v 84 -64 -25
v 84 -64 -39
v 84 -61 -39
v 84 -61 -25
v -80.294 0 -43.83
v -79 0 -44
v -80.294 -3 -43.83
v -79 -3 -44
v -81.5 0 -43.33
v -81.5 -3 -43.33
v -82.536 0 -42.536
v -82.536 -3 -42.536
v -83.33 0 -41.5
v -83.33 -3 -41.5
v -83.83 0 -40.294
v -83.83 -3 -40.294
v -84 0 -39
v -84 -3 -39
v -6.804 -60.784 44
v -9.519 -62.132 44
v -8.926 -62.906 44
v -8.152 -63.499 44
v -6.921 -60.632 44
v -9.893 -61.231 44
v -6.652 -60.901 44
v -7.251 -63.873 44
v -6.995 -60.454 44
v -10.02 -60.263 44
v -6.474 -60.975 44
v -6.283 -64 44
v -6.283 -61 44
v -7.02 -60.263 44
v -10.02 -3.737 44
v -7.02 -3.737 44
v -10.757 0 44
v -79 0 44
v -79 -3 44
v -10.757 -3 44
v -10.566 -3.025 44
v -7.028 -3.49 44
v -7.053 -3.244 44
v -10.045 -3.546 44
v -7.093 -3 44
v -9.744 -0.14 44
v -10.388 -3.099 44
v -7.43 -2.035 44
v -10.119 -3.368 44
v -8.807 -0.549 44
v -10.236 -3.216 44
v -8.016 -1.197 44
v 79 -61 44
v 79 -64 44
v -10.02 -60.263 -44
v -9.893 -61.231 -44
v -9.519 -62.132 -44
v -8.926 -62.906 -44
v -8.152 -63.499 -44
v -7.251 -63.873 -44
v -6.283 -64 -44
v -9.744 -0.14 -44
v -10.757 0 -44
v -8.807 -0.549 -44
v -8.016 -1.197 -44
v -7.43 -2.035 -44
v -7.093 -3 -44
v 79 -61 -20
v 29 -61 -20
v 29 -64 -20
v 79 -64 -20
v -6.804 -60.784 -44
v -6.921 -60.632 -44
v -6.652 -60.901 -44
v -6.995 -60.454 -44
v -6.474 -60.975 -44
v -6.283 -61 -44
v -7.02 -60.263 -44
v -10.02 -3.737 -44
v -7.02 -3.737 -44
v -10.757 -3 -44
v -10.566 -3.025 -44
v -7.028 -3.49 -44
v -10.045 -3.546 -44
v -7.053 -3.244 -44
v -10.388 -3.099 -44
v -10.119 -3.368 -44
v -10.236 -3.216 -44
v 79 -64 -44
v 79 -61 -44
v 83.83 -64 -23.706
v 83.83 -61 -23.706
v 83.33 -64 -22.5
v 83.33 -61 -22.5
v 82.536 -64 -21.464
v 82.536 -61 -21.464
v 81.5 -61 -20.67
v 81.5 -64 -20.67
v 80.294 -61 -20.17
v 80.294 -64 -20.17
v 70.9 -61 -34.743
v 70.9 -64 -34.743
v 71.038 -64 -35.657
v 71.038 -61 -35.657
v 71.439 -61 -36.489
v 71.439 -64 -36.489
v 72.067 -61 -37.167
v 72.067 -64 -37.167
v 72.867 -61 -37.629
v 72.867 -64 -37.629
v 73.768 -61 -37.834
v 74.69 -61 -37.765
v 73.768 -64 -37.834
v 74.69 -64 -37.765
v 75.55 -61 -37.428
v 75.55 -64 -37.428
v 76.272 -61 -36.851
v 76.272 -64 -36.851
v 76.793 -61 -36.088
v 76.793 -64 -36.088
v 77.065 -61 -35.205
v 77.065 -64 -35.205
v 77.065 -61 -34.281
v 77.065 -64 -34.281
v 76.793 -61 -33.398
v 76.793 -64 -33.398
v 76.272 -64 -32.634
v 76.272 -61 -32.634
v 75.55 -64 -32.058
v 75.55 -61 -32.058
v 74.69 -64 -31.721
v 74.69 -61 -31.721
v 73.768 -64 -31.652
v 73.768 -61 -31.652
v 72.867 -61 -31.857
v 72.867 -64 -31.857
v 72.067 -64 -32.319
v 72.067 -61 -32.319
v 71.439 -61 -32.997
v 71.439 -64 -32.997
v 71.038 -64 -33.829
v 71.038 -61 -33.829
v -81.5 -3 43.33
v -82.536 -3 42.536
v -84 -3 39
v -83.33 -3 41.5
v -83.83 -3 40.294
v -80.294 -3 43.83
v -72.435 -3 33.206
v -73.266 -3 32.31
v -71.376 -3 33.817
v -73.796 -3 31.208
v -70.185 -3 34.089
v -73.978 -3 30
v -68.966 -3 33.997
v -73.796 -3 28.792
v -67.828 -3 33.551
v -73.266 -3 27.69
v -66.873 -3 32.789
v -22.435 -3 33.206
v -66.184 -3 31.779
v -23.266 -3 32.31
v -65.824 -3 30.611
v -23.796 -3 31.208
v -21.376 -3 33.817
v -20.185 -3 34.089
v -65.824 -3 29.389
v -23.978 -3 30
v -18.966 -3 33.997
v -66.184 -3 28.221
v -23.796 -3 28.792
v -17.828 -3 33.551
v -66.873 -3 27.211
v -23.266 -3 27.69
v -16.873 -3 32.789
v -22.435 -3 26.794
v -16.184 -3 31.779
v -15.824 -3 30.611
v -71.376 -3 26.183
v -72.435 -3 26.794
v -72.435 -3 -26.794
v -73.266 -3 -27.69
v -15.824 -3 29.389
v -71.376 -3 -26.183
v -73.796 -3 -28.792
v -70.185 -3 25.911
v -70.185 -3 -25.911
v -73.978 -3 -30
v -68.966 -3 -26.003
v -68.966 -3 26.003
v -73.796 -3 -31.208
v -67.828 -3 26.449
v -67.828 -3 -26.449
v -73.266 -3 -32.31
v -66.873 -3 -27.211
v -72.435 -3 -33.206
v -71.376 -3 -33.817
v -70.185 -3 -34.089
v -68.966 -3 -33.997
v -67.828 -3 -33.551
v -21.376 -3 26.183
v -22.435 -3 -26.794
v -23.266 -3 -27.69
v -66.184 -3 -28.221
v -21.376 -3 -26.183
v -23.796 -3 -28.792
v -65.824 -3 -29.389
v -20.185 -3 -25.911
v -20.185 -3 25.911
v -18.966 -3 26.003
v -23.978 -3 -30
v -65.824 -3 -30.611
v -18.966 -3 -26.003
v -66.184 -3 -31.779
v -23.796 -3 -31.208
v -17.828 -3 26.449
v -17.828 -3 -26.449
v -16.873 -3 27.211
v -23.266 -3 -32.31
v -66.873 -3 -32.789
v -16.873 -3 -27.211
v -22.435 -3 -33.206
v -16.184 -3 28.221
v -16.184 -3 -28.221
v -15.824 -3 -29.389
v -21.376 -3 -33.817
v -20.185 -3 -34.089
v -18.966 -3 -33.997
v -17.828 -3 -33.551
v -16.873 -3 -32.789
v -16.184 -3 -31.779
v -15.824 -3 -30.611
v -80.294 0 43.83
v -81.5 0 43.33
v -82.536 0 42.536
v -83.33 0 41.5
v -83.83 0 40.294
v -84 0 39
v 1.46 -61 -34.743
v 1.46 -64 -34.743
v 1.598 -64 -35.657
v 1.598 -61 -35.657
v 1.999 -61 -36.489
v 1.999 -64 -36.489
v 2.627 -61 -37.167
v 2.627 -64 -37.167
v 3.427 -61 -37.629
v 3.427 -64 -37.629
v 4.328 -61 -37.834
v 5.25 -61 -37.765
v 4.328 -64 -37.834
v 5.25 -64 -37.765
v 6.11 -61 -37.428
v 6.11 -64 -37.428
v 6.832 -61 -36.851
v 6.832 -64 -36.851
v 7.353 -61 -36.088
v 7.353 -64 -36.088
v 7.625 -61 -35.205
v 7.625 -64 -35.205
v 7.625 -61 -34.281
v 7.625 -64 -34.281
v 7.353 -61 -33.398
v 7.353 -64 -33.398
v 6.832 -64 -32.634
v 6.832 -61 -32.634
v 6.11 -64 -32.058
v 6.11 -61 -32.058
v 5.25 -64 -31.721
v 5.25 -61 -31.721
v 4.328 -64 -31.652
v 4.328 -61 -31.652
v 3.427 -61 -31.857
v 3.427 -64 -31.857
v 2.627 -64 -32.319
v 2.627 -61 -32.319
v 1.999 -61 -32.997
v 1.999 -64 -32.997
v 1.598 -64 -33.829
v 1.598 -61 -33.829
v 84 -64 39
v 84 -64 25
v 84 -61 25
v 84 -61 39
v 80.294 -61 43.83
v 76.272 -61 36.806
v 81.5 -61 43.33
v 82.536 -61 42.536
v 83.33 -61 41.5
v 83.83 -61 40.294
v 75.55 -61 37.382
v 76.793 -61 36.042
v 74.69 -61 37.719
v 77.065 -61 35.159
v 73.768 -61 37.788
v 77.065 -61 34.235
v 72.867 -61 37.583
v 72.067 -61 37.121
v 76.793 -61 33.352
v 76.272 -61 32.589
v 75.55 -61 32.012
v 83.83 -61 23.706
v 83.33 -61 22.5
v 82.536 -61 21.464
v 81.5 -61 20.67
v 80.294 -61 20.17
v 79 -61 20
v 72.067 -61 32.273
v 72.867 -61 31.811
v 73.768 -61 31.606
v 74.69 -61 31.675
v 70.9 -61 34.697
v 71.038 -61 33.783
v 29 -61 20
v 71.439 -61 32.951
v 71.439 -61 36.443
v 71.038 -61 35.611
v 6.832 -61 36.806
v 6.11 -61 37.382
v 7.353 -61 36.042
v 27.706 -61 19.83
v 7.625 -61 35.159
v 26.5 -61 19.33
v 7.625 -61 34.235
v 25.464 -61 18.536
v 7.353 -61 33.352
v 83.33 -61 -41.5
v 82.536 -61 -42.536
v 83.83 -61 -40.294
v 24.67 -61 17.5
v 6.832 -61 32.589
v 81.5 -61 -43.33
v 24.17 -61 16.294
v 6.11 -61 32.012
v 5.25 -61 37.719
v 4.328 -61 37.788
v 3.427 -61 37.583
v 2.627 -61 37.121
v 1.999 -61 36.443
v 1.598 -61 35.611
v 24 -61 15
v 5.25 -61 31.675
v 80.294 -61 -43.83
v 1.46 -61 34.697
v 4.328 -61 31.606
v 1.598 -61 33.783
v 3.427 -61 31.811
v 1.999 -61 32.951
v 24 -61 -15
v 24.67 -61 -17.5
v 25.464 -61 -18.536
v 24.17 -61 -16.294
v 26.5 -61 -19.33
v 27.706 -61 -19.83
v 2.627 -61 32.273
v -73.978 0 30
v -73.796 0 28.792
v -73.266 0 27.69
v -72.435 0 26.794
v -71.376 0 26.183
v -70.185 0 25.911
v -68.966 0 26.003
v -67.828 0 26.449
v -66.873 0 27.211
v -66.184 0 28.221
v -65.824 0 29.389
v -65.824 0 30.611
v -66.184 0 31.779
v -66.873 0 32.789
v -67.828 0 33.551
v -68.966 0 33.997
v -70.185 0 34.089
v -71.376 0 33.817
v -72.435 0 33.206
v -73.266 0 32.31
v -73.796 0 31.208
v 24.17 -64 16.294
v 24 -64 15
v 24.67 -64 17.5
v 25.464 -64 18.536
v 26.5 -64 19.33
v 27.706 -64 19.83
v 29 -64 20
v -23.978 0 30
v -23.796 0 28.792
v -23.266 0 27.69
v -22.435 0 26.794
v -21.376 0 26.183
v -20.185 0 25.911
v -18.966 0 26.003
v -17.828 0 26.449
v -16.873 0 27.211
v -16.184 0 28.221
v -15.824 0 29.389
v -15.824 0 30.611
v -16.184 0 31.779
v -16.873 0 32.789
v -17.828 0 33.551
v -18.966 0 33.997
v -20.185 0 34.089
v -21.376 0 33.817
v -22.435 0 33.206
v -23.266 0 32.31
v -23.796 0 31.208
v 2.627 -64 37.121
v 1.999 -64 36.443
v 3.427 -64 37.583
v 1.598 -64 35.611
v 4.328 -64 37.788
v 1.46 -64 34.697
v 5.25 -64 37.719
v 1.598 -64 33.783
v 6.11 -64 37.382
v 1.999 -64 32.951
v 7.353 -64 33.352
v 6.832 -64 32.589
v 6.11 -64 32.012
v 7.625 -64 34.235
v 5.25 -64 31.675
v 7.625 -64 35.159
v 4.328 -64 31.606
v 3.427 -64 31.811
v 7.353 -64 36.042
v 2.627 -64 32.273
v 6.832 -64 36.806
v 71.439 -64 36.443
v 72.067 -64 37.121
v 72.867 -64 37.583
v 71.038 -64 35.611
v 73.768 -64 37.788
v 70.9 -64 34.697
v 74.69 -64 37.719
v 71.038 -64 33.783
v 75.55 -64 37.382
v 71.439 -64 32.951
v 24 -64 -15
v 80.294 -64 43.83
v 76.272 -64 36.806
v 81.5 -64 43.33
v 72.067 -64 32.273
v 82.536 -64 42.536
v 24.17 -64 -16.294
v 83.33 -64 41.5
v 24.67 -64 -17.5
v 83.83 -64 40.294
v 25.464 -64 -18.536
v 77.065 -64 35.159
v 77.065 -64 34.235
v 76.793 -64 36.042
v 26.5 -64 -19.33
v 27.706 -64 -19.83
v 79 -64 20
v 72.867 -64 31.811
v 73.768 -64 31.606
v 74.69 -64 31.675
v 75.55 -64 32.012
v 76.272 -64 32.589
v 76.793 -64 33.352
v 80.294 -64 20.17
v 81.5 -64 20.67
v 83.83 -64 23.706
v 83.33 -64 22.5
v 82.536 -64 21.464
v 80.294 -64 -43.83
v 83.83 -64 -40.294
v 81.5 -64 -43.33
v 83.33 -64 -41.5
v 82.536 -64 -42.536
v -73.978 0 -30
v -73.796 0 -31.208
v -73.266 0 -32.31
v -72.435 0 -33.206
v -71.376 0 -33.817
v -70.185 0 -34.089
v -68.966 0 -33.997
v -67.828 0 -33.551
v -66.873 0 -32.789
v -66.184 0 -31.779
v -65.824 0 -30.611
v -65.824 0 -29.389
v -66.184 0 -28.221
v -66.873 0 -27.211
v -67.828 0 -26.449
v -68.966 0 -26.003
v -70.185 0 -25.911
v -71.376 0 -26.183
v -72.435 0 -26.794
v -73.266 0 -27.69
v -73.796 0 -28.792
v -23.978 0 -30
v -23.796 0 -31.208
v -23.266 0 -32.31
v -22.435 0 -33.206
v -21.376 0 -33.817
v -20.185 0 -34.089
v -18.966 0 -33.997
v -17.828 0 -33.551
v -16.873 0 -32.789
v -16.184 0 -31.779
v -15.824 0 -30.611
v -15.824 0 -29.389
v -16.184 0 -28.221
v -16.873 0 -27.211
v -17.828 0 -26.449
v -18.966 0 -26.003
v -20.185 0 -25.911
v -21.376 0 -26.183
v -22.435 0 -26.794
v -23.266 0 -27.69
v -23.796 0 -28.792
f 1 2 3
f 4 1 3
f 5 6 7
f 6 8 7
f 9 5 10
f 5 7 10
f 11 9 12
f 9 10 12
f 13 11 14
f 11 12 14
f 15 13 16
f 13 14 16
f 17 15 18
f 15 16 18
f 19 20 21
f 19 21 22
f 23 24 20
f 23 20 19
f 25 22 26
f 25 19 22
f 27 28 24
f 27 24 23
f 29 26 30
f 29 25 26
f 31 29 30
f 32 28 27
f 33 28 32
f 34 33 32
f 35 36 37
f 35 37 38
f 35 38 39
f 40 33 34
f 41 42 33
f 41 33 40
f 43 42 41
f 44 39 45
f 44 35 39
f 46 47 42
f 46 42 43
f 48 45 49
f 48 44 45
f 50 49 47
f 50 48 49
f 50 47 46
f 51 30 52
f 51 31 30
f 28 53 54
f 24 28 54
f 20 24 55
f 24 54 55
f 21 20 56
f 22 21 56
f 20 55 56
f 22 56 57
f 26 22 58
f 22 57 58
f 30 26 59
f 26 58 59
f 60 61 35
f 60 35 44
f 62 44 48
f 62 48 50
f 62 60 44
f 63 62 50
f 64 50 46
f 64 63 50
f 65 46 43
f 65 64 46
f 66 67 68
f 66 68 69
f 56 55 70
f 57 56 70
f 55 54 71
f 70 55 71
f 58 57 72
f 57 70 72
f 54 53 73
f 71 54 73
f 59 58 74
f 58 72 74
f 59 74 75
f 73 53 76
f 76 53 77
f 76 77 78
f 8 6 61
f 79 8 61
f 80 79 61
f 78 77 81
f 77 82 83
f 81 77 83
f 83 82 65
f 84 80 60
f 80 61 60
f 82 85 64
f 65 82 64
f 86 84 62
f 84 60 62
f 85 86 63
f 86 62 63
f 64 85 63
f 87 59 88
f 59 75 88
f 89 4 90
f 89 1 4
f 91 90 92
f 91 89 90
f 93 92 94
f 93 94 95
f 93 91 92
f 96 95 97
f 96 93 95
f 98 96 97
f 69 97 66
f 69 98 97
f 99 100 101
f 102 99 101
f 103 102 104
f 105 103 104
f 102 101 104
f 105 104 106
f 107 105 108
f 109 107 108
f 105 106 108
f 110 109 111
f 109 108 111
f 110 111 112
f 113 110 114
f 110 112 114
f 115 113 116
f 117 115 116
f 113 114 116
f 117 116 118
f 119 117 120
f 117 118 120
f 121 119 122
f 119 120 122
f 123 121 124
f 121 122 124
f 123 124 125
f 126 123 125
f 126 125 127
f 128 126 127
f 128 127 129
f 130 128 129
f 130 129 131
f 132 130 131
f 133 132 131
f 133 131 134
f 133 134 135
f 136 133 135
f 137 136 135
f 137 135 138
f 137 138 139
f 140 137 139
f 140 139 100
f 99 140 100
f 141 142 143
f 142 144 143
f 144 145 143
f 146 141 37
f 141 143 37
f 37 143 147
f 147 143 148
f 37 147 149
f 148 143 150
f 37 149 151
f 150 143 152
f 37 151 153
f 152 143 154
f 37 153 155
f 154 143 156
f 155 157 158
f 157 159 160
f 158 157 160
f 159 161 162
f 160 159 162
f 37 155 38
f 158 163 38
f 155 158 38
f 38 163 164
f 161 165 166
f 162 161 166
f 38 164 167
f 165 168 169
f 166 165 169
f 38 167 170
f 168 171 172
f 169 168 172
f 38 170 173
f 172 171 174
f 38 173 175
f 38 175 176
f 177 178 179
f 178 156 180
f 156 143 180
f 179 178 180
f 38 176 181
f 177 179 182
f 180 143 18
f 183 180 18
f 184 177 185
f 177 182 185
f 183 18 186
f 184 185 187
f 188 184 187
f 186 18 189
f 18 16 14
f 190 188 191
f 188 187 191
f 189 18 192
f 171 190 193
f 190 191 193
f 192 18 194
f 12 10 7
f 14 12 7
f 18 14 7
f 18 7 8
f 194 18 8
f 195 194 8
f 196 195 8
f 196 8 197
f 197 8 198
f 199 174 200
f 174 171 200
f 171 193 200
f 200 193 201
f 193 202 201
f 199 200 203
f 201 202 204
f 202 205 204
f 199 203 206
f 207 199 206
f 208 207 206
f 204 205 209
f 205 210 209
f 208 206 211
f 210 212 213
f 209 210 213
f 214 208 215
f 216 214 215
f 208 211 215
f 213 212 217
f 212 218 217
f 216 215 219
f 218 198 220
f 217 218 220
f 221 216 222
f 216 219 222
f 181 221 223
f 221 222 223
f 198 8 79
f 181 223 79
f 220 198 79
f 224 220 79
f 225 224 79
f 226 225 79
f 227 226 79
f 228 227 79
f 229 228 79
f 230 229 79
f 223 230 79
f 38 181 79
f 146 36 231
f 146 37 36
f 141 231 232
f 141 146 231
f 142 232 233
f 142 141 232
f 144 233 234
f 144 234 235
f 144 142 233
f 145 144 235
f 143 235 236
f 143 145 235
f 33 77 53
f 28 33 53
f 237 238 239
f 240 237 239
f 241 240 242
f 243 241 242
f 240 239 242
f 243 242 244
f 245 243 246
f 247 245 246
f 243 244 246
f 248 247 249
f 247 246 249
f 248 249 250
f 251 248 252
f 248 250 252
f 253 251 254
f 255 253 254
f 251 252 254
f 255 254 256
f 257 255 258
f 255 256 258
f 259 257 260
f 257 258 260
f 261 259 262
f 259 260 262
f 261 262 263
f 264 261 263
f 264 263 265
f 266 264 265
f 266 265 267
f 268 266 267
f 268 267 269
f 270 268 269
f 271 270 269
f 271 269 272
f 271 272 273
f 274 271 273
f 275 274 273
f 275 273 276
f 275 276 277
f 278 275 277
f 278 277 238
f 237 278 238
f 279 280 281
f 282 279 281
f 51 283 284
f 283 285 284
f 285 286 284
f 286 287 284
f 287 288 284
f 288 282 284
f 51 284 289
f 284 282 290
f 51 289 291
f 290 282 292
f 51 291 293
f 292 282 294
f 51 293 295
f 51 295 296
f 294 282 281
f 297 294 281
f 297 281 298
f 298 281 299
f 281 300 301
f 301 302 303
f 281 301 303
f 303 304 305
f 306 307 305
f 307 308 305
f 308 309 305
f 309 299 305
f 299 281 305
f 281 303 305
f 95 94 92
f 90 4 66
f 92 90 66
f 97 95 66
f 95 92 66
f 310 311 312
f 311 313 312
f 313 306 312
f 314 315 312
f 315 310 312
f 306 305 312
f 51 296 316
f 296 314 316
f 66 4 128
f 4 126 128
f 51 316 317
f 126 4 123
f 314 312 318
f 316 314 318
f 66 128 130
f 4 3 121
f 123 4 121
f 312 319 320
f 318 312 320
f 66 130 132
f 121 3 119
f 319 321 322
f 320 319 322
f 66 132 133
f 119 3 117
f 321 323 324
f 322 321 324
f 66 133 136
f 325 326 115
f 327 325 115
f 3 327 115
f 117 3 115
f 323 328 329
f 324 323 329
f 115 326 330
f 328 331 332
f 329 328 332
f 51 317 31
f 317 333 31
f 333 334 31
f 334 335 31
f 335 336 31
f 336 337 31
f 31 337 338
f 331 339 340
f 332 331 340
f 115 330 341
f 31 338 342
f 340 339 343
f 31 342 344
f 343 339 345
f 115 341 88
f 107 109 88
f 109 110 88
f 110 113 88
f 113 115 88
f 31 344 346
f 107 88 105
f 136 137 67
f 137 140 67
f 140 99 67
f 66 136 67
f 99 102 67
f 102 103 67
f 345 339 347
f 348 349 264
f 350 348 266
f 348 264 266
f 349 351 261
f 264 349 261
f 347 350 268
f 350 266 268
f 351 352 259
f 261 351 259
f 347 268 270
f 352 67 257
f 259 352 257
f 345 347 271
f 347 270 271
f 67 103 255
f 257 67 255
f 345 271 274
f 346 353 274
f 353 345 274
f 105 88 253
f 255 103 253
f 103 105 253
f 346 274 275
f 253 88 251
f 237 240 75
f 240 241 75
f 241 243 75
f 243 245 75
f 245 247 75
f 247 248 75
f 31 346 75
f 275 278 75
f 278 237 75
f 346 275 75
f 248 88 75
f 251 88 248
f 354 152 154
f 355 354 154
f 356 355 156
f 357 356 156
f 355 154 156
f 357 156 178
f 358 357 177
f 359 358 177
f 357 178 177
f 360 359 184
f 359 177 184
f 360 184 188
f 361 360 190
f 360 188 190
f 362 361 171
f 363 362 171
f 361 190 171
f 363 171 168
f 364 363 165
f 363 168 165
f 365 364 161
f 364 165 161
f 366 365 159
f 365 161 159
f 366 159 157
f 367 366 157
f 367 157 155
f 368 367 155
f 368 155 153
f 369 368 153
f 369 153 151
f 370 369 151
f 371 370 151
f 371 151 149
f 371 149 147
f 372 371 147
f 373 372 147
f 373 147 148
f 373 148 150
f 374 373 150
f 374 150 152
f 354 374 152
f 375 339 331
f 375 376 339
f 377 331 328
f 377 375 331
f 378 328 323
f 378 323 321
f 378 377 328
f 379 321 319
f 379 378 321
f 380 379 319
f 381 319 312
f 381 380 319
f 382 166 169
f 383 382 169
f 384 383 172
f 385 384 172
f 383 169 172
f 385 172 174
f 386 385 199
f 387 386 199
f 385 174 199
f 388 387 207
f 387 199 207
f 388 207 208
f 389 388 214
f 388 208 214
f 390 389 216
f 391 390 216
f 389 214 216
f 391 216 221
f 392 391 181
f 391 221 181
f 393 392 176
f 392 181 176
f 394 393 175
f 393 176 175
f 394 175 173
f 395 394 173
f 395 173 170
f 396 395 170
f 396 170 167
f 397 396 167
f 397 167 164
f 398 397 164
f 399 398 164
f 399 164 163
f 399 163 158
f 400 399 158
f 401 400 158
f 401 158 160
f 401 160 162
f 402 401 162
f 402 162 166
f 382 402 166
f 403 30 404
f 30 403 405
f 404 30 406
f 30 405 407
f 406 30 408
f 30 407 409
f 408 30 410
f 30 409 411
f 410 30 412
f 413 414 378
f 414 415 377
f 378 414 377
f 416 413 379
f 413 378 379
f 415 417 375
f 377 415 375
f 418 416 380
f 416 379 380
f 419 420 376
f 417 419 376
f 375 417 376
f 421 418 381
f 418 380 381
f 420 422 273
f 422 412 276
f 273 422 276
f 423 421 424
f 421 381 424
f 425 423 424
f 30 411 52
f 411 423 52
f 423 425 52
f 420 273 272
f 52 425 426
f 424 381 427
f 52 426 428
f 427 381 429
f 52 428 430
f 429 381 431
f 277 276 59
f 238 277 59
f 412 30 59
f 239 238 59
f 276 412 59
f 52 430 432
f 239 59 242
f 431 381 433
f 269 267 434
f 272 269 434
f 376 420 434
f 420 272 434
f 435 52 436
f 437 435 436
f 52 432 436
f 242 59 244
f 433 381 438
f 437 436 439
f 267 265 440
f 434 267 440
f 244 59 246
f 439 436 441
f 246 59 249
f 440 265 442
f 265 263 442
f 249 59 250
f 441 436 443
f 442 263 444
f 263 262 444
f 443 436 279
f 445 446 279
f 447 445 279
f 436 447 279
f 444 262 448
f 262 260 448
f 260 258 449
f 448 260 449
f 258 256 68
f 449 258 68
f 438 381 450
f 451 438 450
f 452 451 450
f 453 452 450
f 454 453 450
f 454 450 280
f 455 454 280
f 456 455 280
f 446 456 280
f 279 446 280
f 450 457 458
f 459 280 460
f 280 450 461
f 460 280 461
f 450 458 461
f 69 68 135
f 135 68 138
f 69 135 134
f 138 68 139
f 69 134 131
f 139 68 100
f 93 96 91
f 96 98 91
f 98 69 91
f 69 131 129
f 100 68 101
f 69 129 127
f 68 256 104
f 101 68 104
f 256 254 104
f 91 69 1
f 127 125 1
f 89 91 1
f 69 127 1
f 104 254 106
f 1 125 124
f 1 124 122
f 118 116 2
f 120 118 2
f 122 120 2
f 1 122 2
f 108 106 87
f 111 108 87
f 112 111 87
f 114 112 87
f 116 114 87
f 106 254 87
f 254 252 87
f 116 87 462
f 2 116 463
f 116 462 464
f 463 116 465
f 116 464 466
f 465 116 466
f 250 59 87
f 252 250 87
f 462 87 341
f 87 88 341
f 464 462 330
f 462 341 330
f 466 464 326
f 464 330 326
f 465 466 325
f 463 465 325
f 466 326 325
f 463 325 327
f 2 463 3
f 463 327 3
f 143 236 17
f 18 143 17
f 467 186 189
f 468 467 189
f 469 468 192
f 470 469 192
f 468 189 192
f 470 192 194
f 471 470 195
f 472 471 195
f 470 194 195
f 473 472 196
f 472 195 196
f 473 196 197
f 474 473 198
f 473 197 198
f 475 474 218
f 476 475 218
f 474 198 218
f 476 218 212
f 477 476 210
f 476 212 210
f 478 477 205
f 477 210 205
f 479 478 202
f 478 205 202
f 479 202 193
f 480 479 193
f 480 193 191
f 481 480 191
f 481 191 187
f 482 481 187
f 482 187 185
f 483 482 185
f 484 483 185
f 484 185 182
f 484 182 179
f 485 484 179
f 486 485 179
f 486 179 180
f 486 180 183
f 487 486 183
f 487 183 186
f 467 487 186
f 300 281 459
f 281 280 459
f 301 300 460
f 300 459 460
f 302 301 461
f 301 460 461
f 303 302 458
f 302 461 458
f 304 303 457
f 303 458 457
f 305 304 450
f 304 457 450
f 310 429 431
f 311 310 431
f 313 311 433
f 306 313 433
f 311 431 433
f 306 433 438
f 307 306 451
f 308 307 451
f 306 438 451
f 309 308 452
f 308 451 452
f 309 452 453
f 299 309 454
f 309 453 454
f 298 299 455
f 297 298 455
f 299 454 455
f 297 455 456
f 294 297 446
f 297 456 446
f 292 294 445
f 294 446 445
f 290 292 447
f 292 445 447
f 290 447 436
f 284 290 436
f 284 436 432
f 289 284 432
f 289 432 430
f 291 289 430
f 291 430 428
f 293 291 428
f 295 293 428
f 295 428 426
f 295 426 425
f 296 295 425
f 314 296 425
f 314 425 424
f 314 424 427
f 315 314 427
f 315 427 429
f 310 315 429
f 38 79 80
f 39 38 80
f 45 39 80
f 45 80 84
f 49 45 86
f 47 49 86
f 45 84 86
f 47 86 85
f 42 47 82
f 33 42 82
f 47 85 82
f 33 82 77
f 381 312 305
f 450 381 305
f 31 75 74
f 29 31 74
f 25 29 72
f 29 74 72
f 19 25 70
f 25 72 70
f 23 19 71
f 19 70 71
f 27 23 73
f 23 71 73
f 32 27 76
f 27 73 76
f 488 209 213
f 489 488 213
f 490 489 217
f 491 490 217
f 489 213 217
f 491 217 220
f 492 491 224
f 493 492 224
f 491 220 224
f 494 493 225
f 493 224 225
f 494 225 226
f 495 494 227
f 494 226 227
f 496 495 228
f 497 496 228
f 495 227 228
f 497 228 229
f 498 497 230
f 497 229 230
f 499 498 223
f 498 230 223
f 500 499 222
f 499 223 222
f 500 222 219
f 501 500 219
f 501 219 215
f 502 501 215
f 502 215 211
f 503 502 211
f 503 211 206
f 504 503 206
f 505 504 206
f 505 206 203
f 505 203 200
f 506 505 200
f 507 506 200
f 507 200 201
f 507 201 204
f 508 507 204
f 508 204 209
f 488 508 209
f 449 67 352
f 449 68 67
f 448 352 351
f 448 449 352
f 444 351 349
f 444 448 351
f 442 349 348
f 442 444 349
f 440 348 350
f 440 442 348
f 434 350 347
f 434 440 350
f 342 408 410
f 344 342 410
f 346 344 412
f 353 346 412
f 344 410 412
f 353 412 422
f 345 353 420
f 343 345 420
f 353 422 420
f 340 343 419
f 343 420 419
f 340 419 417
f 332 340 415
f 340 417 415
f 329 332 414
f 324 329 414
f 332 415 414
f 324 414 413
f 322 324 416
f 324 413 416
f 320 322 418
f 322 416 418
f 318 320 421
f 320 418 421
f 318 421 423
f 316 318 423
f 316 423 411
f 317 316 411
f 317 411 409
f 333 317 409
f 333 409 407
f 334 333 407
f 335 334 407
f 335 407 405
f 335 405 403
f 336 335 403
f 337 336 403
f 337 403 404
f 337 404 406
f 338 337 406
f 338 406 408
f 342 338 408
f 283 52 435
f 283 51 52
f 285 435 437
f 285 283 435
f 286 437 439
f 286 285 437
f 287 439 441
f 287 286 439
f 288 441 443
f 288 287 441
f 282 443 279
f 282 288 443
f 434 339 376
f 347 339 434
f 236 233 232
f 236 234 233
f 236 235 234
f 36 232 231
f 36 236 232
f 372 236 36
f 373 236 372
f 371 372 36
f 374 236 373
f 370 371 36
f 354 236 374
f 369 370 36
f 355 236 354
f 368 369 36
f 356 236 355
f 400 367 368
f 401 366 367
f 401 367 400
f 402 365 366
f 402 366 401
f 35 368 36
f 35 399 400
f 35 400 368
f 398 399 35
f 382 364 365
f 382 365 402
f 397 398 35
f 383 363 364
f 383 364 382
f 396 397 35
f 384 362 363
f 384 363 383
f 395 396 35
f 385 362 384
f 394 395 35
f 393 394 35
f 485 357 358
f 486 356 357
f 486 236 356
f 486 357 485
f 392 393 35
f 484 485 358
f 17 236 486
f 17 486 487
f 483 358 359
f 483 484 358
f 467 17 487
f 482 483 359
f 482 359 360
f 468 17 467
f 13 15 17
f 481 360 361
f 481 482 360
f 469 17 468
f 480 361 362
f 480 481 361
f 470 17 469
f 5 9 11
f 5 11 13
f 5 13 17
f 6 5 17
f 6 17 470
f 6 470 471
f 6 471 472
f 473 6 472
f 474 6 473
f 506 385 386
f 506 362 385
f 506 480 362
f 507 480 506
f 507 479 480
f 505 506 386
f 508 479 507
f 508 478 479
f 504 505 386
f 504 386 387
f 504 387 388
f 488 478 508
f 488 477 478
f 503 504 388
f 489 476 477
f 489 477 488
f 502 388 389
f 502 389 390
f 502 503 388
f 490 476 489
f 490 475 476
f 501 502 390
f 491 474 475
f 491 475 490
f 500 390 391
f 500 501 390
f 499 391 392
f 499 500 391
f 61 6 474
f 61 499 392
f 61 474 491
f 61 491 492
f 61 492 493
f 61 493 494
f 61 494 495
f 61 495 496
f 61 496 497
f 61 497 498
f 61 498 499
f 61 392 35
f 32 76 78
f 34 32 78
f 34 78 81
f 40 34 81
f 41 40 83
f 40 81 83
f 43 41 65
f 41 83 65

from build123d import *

# Parameters (mm, degrees)
SZKIC1_W                       = 168
SZKIC1_H                       = 88
ODGI_CIE_BAZOWE1_DEPTH         = 3
USKOK1_START                   = -44
USKOK1_DEPTH                   = 88
USKOK1_2_DEPTH                 = 88
SZKIC7_W                       = 60
SZKIC7_H                       = 40
WYTNIJ_WYCI_GNI_CIE1_DEPTH     = 113.751940116
ZAOKR_GLENIE1_R                = 5
OTWORY_USTALAJ_CE_6_2MM1_D     = 6.2
OTWORY_USTALAJ_CE_6_2MM1_DEPTH = 27.5
OTWORY_USTALAJ_CE_6_2MM1_TIP   = 1.862667919
OTWORY_USTALAJ_CE_8_0MM2_D     = 8.2
OTWORY_USTALAJ_CE_8_0MM2_DEPTH = 27.5
OTWORY_USTALAJ_CE_8_0MM2_TIP   = 2.463528538


# Read off the part's stored shape, not the designer's step: Uskok1
# Sheet-metal steps are written as plain solids
with BuildPart() as part:
    # Szkic1 → Odgięcie bazowe1 (new body)
    with BuildSketch(Plane(origin=(0, 0, 0), x_dir=(1, 0, 0), z_dir=(0, 1, 0))):
        Rectangle(SZKIC1_W, SZKIC1_H)
    extrude(amount=-ODGI_CIE_BAZOWE1_DEPTH)

    # Uskok1 outline → Uskok1 (cut)
    with BuildSketch(Plane.XY.offset(USKOK1_START)):
        with BuildLine():
            ThreePointArc((-10.756621532, 0), (-8.389154531, -0.845704021), (-7.093344311, -3))
            Line((-7.093344311, -3), (84, -3))
            Line((84, -3), (84, 0))
            Line((84, 0), (-10.756621532, 0))
        make_face()
    extrude(amount=USKOK1_DEPTH, mode=Mode.SUBTRACT)

    # Uskok1 2 outline → Uskok1 2 (add)
    with BuildSketch(Plane.XY.offset(USKOK1_START)):
        with BuildLine():
            ThreePointArc((-10.756621532, -3), (-10.235766677, -3.215745145), (-10.020021532, -3.7366))
            Line((-10.020021532, -3.7366), (-10.020021532, -60.2634))
            ThreePointArc((-10.020021532, -60.2634), (-8.925596731, -62.905575199), (-6.283421532, -64))
            Line((-6.283421532, -64), (84, -64))
            Line((84, -64), (84, -61))
            Line((84, -61), (-6.283421532, -61))
            ThreePointArc((-6.283421532, -61), (-6.804276387, -60.784254855), (-7.020021532, -60.2634))
            Line((-7.020021532, -60.2634), (-7.020021532, -3.7366))
            ThreePointArc((-7.020021532, -3.7366), (-7.038397411, -3.36647982), (-7.093344311, -3))
            Line((-7.093344311, -3), (-10.756621532, -3))
        make_face()
    extrude(amount=USKOK1_2_DEPTH)

    # Szkic7 → Wytnij-wyciągnięcie1 (cut, through all)
    with BuildSketch(Plane(origin=(0, -61, 0), x_dir=(1, 0, 0), z_dir=(0, 1, 0))):
        with Locations((54, 0)):
            Rectangle(SZKIC7_W, SZKIC7_H)
    extrude(amount=-WYTNIJ_WYCI_GNI_CIE1_DEPTH, mode=Mode.SUBTRACT)

    # Zaokrąglenie1
    zaokr_glenie1_edges = [part.edges().sort_by_distance(p)[0] for p in [
        (84, -62.5, -44),
        (84, -62.5, 44),
        (84, -62.5, -20),
        (84, -62.5, 20),
        (24, -62.5, 20),
        (24, -62.5, -20),
        (-84, -1.5, 44),
        (-84, -1.5, -44),
    ]]
    fillet(zaokr_glenie1_edges, radius=ZAOKR_GLENIE1_R)

    # Otwory ustalające Ø6.2mm1
    with Locations(Plane(origin=(0, -61, 0), x_dir=(1, 0, 0), z_dir=(0, 1, 0))):
        with Locations((74, 34.742873432), (74, -34.697126568), (4.56, -34.697126568), (4.56, 34.742873432)):
            Hole(OTWORY_USTALAJ_CE_6_2MM1_D / 2, depth=OTWORY_USTALAJ_CE_6_2MM1_DEPTH)
            with Locations((0, 0, -(OTWORY_USTALAJ_CE_6_2MM1_DEPTH + OTWORY_USTALAJ_CE_6_2MM1_TIP / 2))):  # 118° drill point
                Cone(0, OTWORY_USTALAJ_CE_6_2MM1_D / 2, OTWORY_USTALAJ_CE_6_2MM1_TIP, mode=Mode.SUBTRACT)

    # Otwory ustalające Ø8.0mm2
    with Locations(Plane(origin=(0, 0, 0), x_dir=(1, 0, 0), z_dir=(0, 1, 0))):
        with Locations((-69.878310766, 30), (-19.878310766, 30), (-19.878310766, -30), (-69.878310766, -30)):
            Hole(OTWORY_USTALAJ_CE_8_0MM2_D / 2, depth=OTWORY_USTALAJ_CE_8_0MM2_DEPTH)
            with Locations((0, 0, -(OTWORY_USTALAJ_CE_8_0MM2_DEPTH + OTWORY_USTALAJ_CE_8_0MM2_TIP / 2))):  # 118° drill point
                Cone(0, OTWORY_USTALAJ_CE_8_0MM2_D / 2, OTWORY_USTALAJ_CE_8_0MM2_TIP, mode=Mode.SUBTRACT)


solid = part.part
